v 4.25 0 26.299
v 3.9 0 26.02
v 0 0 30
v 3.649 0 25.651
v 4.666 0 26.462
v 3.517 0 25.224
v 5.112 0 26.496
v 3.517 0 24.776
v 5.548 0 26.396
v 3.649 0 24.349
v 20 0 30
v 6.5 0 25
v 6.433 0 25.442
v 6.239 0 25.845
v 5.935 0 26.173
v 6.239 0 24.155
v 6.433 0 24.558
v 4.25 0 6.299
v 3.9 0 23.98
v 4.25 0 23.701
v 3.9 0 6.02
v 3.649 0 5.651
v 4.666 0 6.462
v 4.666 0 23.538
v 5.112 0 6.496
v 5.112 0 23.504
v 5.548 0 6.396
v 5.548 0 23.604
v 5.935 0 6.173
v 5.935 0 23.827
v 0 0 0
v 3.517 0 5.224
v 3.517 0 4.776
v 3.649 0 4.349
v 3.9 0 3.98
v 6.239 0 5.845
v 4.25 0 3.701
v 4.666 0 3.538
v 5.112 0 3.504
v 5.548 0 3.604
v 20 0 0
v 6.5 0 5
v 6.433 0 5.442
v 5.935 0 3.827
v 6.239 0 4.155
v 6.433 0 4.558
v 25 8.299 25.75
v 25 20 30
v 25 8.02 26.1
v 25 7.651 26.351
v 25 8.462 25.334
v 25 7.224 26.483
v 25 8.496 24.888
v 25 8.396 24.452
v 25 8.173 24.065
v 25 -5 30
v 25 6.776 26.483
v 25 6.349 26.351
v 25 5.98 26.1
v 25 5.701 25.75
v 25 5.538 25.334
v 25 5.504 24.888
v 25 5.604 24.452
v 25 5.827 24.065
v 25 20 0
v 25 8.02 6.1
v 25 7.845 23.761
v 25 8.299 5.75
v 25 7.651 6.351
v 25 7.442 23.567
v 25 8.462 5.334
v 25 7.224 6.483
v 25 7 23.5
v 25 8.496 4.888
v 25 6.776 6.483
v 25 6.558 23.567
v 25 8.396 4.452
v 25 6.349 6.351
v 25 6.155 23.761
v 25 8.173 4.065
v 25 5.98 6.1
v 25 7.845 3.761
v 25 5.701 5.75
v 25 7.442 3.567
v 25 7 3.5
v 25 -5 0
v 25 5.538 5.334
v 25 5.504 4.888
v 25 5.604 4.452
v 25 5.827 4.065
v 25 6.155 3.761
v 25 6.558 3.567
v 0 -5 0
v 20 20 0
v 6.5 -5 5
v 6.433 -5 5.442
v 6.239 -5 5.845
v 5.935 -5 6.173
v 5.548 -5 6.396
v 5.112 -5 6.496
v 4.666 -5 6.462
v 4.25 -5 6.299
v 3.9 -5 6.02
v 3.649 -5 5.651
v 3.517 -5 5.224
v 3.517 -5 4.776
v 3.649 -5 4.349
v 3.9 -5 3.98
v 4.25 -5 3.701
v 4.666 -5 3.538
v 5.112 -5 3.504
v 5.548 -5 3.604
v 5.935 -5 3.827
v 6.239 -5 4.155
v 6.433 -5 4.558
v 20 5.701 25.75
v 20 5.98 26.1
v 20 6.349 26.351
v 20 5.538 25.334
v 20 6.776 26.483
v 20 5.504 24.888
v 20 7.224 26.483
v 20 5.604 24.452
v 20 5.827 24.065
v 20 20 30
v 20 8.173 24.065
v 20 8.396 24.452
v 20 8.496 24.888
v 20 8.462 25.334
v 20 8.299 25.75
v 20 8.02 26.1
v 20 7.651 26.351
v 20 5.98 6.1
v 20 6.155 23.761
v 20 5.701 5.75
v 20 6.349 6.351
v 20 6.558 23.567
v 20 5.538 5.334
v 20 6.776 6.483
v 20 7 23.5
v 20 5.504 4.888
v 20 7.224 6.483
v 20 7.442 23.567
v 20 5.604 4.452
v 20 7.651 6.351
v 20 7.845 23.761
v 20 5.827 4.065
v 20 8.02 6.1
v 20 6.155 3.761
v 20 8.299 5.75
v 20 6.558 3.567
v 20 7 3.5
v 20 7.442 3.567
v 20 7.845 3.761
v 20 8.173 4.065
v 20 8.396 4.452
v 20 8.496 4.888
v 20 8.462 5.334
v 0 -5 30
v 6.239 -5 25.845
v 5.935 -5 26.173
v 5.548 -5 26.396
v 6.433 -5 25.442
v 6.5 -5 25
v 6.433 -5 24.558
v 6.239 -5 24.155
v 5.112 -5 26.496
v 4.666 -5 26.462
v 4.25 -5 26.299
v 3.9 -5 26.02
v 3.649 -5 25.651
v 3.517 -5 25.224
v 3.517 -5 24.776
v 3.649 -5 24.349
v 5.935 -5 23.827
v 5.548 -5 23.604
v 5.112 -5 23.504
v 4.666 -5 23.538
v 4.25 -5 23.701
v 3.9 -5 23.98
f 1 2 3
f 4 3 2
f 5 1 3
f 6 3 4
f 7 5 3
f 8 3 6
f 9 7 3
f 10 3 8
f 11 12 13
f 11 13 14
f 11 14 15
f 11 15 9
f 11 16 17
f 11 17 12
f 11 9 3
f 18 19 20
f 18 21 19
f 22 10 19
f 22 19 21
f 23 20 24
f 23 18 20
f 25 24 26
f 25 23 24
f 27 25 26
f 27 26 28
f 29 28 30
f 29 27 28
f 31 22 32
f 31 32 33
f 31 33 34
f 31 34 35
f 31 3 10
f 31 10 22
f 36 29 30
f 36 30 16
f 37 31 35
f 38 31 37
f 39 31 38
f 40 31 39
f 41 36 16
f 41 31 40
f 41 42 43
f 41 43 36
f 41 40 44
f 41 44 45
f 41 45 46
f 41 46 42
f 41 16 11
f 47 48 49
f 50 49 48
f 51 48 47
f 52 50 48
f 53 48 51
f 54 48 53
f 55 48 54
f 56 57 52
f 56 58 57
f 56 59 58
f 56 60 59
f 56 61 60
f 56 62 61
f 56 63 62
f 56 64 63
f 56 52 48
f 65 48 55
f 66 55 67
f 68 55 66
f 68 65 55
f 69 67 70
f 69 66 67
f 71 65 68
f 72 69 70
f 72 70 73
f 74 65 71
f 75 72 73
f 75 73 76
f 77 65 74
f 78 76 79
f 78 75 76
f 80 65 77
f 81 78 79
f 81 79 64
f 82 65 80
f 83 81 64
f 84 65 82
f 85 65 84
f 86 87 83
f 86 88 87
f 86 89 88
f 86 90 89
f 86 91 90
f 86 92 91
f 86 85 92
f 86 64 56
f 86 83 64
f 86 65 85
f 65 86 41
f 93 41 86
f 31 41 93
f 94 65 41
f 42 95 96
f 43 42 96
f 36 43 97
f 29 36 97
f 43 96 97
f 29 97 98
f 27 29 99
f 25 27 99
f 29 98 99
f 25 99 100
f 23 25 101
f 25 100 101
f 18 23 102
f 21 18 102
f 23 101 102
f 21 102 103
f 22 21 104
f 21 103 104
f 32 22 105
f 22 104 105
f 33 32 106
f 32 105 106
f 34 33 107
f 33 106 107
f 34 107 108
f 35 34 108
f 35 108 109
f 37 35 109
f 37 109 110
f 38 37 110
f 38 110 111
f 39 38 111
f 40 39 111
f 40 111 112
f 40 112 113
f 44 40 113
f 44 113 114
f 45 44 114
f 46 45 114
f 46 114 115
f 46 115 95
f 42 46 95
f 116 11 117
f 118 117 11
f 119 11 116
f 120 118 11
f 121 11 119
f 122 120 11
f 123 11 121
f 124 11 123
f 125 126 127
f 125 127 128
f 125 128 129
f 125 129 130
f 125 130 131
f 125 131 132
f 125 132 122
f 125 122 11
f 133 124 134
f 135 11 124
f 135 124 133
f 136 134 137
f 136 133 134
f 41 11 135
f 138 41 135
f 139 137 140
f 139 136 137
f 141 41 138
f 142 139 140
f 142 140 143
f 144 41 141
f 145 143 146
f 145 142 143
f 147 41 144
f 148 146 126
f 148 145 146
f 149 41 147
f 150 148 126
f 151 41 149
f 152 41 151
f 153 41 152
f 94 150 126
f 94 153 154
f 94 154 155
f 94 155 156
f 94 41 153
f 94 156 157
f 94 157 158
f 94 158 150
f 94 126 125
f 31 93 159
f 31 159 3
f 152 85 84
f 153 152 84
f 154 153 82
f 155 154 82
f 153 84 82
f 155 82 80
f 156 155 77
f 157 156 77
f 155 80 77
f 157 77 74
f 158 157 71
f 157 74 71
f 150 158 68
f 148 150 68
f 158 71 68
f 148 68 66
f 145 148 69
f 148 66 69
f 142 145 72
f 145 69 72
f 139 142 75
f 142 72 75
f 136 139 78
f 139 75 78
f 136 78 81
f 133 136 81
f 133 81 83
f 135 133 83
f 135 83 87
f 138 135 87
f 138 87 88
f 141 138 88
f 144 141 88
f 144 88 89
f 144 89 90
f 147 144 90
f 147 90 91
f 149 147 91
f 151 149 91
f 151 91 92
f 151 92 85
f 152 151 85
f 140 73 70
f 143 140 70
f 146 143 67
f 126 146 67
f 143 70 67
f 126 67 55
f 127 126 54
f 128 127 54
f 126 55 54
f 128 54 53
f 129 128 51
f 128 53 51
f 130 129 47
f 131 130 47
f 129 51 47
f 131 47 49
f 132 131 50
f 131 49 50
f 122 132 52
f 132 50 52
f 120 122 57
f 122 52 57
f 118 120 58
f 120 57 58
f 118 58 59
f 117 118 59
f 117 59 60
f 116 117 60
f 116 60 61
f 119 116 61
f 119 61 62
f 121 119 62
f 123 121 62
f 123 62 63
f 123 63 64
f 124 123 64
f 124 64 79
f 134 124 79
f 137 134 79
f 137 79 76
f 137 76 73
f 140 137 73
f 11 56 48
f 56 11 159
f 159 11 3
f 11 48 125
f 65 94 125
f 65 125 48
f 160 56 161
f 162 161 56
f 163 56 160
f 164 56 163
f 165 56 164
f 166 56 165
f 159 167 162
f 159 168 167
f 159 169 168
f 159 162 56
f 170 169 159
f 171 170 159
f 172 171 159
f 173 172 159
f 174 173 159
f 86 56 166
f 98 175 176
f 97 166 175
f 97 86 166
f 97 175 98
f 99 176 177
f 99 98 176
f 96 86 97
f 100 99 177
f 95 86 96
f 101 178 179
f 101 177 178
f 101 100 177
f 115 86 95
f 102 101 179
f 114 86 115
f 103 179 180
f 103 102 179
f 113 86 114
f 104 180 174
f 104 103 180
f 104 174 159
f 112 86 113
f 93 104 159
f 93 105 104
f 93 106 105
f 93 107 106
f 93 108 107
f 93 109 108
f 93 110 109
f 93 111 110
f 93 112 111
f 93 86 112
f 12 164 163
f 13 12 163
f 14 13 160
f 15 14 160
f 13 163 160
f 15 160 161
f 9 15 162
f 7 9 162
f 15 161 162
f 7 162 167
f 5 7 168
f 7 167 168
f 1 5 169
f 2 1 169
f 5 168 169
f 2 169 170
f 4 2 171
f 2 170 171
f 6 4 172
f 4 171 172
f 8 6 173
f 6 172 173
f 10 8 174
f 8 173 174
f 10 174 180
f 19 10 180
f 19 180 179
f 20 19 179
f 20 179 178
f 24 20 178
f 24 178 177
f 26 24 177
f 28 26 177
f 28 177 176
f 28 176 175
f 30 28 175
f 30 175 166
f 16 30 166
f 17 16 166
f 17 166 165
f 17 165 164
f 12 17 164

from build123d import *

# Parameters (mm, degrees)
SALIENTE_EXTRUIR1_DEPTH = 30
CROQUIS2_R              = 1.5
CORTAR_EXTRUIR1_DEPTH   = 30
CROQUIS3_R              = 1.5
CORTAR_EXTRUIR2_DEPTH   = 30


with BuildPart() as part:
    # Croquis1 → Saliente-Extruir1 (new body)
    with BuildSketch(Plane.XY):
        Polygon((0, 0), (20, 0), (20, 20), (25, 20), (25, -5), (0, -5), align=None)
    extrude(amount=SALIENTE_EXTRUIR1_DEPTH)

    # Croquis2 → Cortar-Extruir1 (cut)
    with BuildSketch(Plane(origin=(25, 0, 0), x_dir=(0, 0, -1), z_dir=(1, 0, 0))):
        with Locations((-25, 7)):
            Circle(CROQUIS2_R)
        with Locations((-5, 7)):
            Circle(CROQUIS2_R)
    extrude(amount=-CORTAR_EXTRUIR1_DEPTH, mode=Mode.SUBTRACT)

    # Croquis3 → Cortar-Extruir2 (cut)
    with BuildSketch(Plane.XZ.offset(5)):
        with Locations((5, 5)):
            Circle(CROQUIS3_R)
        with Locations((5, 25)):
            Circle(CROQUIS3_R)
    extrude(amount=-CORTAR_EXTRUIR2_DEPTH, mode=Mode.SUBTRACT)


solid = part.part
